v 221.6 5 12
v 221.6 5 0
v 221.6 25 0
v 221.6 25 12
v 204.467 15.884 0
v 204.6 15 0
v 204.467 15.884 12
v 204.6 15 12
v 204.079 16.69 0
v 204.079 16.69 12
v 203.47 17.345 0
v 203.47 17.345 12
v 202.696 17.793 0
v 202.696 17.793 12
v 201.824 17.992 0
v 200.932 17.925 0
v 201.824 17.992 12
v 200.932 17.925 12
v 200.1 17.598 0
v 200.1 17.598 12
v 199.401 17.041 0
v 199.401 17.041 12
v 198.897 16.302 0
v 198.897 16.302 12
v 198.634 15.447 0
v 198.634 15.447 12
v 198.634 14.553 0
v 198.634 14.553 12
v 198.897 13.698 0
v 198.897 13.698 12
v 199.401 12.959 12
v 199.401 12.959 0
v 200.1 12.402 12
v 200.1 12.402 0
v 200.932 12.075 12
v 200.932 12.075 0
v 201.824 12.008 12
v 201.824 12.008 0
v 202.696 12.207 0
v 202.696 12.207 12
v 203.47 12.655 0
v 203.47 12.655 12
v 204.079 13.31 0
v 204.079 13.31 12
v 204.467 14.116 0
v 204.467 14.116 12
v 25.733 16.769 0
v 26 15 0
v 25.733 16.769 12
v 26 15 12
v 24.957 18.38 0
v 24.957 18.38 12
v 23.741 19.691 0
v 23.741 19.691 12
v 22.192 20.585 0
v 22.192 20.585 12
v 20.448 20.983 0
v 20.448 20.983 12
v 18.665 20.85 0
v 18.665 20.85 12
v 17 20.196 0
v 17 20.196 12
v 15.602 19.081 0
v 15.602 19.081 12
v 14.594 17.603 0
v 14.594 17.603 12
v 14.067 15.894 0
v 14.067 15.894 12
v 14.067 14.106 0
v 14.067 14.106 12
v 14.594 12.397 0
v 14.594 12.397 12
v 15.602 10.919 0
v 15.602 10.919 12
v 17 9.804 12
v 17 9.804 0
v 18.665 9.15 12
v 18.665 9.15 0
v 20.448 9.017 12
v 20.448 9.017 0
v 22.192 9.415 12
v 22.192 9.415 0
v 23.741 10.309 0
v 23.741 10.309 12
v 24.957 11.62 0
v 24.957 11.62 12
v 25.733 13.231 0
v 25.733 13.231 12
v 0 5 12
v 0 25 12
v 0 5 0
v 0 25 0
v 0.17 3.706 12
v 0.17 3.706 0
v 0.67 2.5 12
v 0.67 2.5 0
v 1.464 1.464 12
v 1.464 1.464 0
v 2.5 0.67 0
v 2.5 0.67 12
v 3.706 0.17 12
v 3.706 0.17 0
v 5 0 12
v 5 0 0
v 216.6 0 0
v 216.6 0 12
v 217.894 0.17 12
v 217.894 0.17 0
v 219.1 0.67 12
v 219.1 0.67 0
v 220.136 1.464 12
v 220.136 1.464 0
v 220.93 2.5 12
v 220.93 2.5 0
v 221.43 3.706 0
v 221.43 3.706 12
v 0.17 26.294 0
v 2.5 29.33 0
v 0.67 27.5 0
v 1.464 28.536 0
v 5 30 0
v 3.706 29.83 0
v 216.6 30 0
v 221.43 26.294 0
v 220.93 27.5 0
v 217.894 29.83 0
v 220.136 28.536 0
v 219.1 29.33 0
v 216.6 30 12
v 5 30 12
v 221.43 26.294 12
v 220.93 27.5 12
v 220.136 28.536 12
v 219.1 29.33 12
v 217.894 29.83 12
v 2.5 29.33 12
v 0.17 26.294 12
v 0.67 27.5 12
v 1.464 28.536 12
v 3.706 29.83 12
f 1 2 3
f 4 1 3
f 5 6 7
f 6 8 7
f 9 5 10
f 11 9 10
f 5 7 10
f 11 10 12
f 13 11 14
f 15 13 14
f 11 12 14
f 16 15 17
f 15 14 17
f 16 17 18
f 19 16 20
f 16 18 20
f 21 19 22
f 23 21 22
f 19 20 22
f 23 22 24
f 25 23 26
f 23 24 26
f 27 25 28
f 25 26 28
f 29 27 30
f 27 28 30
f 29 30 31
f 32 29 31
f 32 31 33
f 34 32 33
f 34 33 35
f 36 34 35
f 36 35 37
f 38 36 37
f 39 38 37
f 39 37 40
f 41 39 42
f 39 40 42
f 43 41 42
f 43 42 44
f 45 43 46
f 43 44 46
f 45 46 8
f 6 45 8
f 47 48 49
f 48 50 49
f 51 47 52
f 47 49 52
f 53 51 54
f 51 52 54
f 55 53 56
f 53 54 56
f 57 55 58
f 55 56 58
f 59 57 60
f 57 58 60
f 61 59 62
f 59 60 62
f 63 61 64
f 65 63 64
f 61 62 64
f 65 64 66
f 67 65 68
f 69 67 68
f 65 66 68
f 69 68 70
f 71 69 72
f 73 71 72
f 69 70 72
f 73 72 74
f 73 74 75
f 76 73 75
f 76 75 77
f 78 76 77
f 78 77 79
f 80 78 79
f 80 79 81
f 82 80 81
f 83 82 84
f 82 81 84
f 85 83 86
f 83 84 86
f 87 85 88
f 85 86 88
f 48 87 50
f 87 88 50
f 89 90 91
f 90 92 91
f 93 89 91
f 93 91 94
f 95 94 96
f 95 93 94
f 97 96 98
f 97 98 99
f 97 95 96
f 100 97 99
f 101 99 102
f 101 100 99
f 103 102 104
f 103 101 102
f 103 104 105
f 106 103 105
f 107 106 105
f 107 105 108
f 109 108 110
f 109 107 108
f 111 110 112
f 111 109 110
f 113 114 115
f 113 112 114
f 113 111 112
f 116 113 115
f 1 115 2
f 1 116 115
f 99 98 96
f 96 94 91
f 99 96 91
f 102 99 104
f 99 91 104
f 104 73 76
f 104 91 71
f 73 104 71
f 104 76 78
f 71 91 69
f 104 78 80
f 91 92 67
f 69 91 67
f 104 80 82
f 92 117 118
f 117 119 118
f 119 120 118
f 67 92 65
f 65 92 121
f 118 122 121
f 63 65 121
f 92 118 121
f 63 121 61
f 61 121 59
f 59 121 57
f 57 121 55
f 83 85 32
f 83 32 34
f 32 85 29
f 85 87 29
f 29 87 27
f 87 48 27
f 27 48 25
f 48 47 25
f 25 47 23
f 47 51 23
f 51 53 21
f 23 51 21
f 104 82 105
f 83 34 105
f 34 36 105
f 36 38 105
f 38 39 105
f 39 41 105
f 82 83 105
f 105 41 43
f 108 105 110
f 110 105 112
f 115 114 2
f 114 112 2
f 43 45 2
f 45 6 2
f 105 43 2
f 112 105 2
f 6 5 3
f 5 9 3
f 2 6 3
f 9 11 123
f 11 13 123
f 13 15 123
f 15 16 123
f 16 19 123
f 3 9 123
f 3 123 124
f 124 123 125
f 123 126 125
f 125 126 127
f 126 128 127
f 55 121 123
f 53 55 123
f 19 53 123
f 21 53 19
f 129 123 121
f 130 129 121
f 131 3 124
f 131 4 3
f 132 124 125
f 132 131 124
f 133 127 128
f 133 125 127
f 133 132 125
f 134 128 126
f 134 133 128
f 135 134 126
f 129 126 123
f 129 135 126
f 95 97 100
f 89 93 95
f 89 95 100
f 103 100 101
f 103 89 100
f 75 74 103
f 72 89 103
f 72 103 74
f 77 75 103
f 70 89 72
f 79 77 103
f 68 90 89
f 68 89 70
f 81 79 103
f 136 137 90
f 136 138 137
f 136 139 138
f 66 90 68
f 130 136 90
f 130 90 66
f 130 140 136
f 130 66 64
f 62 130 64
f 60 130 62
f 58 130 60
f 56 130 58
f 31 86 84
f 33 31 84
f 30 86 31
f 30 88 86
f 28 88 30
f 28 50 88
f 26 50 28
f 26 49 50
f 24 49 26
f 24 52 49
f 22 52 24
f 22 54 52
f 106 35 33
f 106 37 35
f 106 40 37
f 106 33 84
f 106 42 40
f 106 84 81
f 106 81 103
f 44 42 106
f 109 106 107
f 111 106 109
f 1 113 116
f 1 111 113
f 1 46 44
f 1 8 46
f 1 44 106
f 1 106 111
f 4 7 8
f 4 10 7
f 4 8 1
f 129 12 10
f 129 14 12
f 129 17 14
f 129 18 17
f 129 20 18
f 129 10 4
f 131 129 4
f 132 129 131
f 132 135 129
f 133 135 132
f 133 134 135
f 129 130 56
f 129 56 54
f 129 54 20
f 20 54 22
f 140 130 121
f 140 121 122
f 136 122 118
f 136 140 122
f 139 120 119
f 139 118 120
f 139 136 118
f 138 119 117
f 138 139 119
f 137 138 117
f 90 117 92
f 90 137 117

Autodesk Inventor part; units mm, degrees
ref_plane "YZ Plane" through (0, 0, 0) normal (1, 0, 0) x (0, 1, 0)
ref_plane "XZ Plane" through (0, 0, 0) normal (0, 1, 0) x (-1, 0, 0)
ref_plane "XY Plane" through (0, 0, 0) normal (0, 0, 1) x (1, 0, 0)
sketch "Sketch1" plane through (0, 0, 0) normal (0, 0, 1) x (1, 0, 0)
  line L0 (0, 0) -> (221.6, 0)
  line L1 (221.6, 0) -> (221.6, 30)
  line L2 (221.6, 30) -> (0, 30)
  line L3 (0, 30) -> (0, 0)
  dimension "d0" = 221.6
  dimension "d1" = 30
extrude "Extrusion1" add sketch "Sketch1" along normal blind 12
fillet "Fillet1" radius 5 4 edges at (0, 30, 6) (0, 0, 6) (221.6, 0, 6) (221.6, 30, 6)
sketch "Sketch2" plane through (0, 0, 12) normal (0, 0, 1) x (1, 0, 0)
  line L0 (0, 25) -> (0, 5) projected
  line L1 (0, 15) -> (20, 15)
  circle A0 centre (20, 15) radius 6
  line L2 (5, 0) -> (216.6, 0) projected
  line L3 (110.8, 0) -> (110.8, 30)
  line L4 (216.6, 30) -> (5, 30) projected
  line L5 (221.6, 5) -> (221.6, 25) projected
  line L6 (221.6, 15) -> (201.6, 15)
  circle A1 centre (201.6, 15) radius 3
  point P0 (0, 0)
  dimension "d5" = 20
  dimension "d6" = 12
  dimension "d9" = 20
  dimension "d10" = 6
extrude "Extrusion2" cut sketch "Sketch2" against normal through all
ref_plane "Work Plane1" through (0, 0, 6) normal (0, 0, 1) x (1, 0, 0)
properties part number "Fourbar-Rocker"
